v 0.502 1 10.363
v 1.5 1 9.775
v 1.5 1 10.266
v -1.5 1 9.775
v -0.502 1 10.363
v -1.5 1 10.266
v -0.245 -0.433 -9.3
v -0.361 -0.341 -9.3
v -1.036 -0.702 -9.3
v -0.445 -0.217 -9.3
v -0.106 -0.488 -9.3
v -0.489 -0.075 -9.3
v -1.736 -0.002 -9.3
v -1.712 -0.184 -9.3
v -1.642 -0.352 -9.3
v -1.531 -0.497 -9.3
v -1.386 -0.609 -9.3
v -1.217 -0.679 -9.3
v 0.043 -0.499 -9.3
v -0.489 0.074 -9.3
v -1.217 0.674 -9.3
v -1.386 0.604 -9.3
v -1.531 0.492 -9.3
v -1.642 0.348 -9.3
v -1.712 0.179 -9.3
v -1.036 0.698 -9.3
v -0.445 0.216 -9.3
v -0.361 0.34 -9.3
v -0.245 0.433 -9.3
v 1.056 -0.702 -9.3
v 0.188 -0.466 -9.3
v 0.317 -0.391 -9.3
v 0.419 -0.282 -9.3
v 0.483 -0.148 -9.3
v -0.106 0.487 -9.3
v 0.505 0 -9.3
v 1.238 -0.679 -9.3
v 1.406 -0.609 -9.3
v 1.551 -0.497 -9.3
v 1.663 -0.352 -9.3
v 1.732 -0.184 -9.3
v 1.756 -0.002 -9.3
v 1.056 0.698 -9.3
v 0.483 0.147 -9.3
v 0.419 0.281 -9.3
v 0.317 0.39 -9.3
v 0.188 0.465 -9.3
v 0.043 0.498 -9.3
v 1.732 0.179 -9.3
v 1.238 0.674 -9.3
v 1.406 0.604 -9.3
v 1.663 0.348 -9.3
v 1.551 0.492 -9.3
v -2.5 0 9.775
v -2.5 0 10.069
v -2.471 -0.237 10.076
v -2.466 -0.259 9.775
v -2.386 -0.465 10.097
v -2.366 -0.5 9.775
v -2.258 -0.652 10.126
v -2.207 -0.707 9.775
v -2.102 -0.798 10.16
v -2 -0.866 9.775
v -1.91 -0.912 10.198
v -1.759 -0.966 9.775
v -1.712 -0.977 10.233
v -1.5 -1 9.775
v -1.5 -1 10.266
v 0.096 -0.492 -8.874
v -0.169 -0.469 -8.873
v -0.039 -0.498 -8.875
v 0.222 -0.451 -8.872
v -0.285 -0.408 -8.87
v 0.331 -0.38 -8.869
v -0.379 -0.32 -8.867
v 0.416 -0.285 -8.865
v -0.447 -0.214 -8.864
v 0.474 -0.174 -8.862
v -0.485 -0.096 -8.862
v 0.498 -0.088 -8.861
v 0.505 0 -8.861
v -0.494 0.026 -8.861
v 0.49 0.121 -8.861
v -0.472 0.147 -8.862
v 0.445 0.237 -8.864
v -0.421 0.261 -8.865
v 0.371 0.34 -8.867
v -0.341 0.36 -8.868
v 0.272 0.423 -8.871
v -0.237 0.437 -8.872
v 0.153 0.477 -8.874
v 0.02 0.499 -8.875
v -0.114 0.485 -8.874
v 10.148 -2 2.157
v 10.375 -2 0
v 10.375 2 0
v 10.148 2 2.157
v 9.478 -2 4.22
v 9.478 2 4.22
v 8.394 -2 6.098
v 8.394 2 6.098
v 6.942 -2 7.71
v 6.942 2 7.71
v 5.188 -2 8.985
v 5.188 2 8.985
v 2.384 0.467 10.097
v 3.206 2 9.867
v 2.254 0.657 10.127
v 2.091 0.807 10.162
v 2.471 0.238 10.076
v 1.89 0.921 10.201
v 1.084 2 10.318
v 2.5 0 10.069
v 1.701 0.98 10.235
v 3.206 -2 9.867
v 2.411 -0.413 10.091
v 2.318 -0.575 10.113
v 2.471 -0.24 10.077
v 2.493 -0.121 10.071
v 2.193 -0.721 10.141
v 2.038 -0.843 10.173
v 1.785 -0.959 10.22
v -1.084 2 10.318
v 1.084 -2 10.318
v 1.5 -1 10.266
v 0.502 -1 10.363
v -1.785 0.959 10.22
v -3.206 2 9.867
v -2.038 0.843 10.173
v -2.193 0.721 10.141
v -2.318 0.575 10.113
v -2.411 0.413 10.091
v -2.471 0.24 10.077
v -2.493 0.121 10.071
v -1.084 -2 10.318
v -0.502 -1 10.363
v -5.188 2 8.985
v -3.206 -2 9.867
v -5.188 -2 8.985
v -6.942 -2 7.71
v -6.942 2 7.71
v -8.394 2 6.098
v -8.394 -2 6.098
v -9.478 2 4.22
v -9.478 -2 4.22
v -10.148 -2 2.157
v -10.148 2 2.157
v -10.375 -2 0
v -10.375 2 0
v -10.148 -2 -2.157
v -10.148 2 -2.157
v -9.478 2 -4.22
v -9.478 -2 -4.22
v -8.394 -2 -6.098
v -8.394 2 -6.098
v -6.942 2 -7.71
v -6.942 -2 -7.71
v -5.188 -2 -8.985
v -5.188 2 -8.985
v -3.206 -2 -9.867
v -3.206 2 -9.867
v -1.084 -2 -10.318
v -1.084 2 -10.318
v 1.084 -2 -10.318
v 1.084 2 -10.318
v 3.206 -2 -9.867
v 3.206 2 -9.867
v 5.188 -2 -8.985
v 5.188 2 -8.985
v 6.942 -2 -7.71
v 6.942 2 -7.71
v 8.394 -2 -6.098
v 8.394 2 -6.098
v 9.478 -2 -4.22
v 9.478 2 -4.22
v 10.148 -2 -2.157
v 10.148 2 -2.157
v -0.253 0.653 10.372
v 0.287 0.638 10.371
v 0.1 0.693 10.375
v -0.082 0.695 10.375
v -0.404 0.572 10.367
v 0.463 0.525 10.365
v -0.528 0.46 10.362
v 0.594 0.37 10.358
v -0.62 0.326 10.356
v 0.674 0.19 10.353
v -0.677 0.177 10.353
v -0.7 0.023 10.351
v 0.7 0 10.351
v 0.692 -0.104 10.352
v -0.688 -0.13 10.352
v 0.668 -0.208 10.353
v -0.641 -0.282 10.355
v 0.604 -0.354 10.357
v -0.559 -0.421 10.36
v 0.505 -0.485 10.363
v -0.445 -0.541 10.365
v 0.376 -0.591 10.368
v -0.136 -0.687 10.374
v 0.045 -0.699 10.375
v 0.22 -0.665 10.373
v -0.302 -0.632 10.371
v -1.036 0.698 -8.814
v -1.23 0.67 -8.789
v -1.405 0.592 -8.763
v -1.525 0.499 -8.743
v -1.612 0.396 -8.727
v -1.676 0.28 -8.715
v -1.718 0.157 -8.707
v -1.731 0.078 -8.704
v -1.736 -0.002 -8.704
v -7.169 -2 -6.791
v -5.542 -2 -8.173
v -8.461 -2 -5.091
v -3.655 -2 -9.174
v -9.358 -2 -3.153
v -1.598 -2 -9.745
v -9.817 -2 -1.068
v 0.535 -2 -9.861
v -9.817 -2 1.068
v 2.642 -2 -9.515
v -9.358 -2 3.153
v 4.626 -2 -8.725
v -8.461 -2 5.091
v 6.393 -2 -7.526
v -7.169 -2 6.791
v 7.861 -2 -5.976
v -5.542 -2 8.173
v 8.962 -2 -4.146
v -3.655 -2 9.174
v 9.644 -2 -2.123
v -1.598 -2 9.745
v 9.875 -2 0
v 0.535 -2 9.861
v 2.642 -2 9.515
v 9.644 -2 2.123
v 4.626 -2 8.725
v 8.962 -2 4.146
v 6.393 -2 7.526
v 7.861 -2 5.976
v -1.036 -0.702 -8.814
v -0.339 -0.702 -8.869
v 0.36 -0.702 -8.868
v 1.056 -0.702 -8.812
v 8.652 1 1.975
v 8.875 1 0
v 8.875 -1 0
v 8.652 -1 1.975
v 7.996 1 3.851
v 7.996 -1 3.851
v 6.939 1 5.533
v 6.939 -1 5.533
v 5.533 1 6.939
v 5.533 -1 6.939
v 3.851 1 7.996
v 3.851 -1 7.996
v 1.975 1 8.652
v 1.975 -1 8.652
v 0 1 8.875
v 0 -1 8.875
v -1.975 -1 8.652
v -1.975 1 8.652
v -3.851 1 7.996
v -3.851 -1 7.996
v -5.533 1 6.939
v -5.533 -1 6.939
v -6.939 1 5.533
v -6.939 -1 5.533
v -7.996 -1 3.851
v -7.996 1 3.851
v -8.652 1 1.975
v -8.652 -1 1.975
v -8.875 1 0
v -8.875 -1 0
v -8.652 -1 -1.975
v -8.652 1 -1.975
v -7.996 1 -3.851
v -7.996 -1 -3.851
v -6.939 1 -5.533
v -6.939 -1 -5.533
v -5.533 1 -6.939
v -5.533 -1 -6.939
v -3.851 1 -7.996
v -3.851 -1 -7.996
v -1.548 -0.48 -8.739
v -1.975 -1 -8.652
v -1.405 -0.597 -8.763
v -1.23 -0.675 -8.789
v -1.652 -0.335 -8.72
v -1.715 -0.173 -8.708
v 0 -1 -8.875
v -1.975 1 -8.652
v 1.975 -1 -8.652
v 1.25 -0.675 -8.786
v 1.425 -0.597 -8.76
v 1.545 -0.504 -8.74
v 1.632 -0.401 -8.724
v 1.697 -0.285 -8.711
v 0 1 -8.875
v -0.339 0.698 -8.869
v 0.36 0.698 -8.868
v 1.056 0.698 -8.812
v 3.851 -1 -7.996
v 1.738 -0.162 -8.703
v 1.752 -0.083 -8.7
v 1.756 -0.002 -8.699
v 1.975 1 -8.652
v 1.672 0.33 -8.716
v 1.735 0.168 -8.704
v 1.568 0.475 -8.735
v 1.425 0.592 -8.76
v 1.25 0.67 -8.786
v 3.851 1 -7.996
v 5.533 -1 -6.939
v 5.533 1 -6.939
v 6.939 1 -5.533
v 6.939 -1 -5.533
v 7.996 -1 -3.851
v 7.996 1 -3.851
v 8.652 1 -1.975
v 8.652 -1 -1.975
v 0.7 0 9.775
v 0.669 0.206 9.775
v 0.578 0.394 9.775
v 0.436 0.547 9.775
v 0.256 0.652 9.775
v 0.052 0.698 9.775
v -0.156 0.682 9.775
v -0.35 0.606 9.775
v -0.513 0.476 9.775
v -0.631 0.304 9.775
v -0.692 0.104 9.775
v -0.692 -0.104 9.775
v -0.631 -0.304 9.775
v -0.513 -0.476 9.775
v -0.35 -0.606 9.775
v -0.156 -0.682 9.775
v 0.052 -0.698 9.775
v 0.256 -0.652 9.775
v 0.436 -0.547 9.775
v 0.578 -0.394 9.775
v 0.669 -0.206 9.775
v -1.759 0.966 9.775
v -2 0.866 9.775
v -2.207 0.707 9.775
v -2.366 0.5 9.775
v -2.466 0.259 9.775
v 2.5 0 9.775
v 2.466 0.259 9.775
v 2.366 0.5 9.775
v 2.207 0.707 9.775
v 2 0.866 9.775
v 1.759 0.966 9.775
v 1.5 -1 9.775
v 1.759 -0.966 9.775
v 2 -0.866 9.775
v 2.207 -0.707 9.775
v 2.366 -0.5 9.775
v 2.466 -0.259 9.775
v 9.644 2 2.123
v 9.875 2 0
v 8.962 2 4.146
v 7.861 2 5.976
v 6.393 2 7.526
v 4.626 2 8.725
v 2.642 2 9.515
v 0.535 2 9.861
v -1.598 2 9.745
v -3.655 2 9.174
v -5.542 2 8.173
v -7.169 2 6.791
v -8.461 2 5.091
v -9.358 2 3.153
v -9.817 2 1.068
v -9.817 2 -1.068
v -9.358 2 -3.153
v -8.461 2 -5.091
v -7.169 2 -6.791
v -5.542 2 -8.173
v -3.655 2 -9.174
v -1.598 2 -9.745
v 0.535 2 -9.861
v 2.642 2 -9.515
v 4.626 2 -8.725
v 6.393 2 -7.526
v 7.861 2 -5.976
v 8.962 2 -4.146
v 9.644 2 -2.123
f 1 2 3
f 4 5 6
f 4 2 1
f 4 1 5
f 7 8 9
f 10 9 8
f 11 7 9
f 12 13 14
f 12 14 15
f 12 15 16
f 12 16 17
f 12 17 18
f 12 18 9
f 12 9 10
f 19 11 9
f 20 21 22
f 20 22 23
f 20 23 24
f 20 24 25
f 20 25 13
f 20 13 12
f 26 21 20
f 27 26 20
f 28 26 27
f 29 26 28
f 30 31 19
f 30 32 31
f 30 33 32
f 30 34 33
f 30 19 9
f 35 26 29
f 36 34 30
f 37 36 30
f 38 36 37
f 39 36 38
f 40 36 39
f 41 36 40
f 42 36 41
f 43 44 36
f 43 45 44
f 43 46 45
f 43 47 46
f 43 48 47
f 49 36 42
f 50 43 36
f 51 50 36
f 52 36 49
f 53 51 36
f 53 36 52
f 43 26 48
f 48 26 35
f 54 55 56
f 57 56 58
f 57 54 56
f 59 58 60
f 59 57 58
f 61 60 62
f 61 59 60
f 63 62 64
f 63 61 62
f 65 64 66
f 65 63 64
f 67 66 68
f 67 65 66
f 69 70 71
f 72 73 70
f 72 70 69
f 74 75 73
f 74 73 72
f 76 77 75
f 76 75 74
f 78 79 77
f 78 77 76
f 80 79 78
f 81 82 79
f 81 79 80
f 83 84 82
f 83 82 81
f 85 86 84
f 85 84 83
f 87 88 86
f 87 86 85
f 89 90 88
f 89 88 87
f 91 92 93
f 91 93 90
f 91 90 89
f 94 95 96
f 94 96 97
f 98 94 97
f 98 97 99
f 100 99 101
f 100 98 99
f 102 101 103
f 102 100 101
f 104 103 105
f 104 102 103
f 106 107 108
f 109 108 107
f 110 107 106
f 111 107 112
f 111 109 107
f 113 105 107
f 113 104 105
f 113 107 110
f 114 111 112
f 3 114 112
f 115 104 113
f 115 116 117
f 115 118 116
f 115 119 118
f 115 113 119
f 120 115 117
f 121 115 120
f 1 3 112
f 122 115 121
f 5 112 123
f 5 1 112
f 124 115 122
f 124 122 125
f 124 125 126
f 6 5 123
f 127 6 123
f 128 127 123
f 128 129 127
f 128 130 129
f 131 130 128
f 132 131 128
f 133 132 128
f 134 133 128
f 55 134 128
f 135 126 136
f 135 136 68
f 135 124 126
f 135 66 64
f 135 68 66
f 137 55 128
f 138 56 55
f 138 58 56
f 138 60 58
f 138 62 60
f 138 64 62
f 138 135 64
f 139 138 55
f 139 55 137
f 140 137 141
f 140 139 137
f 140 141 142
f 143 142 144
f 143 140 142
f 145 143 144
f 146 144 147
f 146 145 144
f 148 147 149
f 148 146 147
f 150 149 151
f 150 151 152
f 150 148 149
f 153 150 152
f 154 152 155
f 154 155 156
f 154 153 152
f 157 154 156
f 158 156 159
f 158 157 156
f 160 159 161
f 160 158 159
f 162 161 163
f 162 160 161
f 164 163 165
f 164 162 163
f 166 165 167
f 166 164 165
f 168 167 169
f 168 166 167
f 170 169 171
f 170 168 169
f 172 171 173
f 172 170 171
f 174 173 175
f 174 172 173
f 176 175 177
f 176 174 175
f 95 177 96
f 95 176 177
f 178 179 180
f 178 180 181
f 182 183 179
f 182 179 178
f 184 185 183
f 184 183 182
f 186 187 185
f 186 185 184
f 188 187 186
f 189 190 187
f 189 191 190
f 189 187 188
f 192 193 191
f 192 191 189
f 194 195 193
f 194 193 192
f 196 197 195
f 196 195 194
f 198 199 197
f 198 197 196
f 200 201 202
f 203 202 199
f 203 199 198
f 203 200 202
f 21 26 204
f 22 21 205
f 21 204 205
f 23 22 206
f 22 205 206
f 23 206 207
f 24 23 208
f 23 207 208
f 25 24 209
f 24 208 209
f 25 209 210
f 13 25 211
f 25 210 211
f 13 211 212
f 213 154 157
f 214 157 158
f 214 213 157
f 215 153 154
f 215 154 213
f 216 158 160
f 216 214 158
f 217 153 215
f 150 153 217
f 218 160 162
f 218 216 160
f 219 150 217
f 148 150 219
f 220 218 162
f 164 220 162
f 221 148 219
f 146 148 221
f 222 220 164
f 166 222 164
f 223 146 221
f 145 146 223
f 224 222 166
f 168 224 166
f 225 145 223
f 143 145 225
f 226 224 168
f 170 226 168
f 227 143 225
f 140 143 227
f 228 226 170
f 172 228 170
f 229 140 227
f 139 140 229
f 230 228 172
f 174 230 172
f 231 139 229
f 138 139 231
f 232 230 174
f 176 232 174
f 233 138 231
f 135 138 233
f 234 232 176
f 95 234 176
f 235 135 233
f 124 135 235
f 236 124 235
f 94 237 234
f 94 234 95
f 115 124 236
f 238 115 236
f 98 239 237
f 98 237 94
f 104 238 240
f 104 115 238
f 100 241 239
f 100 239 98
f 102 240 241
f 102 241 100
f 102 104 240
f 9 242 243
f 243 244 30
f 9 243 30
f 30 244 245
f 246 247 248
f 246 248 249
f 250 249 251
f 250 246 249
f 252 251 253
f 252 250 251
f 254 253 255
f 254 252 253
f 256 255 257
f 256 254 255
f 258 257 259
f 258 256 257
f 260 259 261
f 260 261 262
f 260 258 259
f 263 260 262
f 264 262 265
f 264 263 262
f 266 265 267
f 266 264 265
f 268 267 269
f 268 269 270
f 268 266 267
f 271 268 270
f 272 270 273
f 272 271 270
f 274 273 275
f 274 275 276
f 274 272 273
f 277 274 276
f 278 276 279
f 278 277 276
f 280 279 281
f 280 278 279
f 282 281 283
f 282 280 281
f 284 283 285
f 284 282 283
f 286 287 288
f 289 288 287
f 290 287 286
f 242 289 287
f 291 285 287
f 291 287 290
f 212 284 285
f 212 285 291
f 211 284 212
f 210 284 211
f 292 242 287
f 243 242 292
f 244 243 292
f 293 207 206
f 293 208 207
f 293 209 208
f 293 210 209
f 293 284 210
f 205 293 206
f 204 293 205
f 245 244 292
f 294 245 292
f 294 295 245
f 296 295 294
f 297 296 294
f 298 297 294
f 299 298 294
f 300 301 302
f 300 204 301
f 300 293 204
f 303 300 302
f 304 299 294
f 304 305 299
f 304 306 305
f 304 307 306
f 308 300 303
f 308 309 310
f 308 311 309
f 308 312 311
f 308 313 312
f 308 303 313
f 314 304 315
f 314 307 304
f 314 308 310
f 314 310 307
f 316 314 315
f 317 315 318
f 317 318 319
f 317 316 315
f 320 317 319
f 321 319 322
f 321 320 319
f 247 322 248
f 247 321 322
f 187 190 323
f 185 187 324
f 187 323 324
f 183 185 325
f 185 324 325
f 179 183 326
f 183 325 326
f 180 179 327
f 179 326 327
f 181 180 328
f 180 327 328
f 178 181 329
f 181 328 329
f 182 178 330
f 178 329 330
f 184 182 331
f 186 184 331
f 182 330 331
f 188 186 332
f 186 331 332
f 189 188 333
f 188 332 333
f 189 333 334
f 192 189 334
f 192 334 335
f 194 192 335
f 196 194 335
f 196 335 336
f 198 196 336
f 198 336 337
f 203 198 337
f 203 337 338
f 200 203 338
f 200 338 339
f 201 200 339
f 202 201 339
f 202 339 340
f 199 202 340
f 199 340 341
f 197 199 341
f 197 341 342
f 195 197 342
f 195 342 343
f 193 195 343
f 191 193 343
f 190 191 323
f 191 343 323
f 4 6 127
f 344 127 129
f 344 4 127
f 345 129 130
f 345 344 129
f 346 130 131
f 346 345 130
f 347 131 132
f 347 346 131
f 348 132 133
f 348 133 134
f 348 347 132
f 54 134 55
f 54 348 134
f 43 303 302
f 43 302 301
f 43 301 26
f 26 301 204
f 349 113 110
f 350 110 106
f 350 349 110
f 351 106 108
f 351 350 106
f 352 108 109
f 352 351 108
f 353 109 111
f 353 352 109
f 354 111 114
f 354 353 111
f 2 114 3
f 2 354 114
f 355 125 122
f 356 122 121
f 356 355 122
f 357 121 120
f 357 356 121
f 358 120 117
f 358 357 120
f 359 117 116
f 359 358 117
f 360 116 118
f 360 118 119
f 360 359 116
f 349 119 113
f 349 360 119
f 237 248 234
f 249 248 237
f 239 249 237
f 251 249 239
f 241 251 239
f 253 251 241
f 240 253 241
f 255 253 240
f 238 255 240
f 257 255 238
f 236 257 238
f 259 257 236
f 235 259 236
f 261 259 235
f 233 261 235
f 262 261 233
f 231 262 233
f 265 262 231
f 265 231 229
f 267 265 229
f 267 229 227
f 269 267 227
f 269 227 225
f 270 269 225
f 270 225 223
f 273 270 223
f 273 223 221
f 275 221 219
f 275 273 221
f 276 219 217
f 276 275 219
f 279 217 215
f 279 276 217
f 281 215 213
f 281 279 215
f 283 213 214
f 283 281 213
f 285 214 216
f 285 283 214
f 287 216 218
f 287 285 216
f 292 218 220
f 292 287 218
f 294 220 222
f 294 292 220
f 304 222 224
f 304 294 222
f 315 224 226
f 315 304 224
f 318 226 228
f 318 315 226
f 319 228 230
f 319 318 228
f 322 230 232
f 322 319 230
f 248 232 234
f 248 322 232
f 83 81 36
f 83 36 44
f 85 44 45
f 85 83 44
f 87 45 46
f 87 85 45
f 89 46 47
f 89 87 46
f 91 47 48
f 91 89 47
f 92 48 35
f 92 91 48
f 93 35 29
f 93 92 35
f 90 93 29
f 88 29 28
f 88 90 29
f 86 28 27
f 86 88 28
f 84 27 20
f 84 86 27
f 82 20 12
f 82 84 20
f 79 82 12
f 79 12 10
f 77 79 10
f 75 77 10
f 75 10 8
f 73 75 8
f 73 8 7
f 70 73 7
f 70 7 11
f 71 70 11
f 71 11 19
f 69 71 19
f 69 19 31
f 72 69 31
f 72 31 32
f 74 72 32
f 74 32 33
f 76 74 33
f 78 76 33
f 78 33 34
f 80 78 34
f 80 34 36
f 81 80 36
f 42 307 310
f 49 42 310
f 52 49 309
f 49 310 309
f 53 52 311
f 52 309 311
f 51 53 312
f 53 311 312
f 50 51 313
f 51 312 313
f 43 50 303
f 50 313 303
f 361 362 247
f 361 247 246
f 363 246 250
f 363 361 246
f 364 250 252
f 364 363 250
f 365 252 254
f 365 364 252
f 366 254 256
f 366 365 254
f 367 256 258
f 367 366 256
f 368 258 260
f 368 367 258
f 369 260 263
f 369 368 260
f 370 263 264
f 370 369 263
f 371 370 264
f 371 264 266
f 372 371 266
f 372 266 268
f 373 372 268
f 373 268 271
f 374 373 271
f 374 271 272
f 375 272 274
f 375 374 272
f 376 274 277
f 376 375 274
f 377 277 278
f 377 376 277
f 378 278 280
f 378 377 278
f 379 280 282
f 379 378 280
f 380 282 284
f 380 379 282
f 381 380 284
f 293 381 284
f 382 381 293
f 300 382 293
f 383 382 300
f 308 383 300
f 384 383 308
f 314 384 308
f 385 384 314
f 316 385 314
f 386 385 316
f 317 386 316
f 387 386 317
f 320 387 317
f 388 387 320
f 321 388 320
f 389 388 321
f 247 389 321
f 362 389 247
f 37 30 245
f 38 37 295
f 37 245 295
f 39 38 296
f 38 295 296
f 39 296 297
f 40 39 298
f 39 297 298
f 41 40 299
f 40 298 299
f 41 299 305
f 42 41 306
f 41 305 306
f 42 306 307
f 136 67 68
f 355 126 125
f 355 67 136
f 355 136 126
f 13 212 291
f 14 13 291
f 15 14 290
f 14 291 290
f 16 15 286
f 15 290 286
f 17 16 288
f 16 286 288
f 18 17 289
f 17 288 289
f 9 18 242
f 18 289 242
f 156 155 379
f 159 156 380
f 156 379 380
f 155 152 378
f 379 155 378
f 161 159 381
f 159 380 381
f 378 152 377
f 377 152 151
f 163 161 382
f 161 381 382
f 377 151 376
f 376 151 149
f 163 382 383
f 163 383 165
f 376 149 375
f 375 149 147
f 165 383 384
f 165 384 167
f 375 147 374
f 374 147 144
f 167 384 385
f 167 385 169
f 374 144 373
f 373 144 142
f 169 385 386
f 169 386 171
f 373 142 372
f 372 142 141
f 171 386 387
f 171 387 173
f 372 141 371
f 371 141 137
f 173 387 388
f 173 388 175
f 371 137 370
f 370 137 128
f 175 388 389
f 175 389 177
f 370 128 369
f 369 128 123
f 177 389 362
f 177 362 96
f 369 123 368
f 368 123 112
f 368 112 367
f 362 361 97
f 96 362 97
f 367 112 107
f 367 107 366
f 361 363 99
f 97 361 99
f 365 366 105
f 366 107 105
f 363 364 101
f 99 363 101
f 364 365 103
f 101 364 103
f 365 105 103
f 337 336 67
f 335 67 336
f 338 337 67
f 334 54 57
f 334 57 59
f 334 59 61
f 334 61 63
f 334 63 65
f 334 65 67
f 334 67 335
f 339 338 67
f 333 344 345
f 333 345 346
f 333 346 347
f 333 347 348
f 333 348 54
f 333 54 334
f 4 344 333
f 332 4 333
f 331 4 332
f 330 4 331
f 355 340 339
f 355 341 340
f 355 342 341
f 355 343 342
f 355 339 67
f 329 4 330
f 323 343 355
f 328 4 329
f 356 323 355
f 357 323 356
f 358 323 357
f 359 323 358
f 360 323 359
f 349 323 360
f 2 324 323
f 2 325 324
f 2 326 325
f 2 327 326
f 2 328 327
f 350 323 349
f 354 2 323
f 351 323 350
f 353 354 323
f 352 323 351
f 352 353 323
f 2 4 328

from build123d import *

# Parameters (mm, degrees)
F0_R          = 10.375
F0_R_2        = 8.875
F1_DEPTH      = 2
F1_DEPTH_BACK = 2
F2_SIZE       = 1
F4_START      = 9.775
F3_R          = 0.7
F4_DEPTH      = 15.225
F5_R          = 0.5
F6_DEPTH      = 9.3


with BuildPart() as f1:
    # F0 (on Front) → F1 (new body, two sides)
    with BuildSketch(Plane.XZ) as f1_sk:
        Circle(F0_R)
        Circle(F0_R_2, mode=Mode.SUBTRACT)
    extrude(amount=F1_DEPTH)
    extrude(f1_sk.sketch, amount=-F1_DEPTH_BACK)

    # F2
    f2_edges = [f1.edges().sort_by_distance(p)[0] for p in [
        (-8.875, -2, 0),
        (-8.875, 2, 0),
    ]]
    chamfer(f2_edges, length=F2_SIZE)

    # F3 (on Top) → F4 (cut)
    with BuildSketch(Plane.XY.offset(F4_START)):
        with BuildLine():
            Line((-1.5, -1), (1.5, -1))
            ThreePointArc((1.5, -1), (2.2071067812, -0.7071067812), (2.5, 0))
            ThreePointArc((2.5, 0), (2.2071067812, 0.7071067812), (1.5, 1))
            Line((1.5, 1), (-1.5, 1))
            ThreePointArc((-1.5, 1), (-2.2071067812, 0.7071067812), (-2.5, 0))
            ThreePointArc((-2.5, 0), (-2.2071067812, -0.7071067812), (-1.5, -1))
        make_face()
        Circle(F3_R, mode=Mode.SUBTRACT)
    extrude(amount=F4_DEPTH, mode=Mode.SUBTRACT)

    # F5 (on Top) → F6 (cut)
    with BuildSketch(Plane.XY):
        with BuildLine():
            ThreePointArc((1.7263360261, -2.2374776466), (1.521310773, -1.7425028998), (1.0263360261, -1.5374776466))
            Line((1.0263360261, -1.5374776466), (-1.0660886515, -1.5374776466))
            ThreePointArc((-1.0660886515, -1.5374776466), (-1.5610633983, -1.7425028998), (-1.7660886515, -2.2374776466))
            ThreePointArc((-1.7660886515, -2.2374776466), (-1.5610633983, -2.7324523935), (-1.0660886515, -2.9374776466))
            Line((-1.0660886515, -2.9374776466), (1.0263360261, -2.9374776466))
            ThreePointArc((1.0263360261, -2.9374776466), (1.521310773, -2.7324523935), (1.7263360261, -2.2374776466))
        make_face()
        with BuildLine():
            ThreePointArc((1.7563359968, -0.0024776423), (1.5513107436, 0.4924971045), (1.0563359968, 0.6975223577))
            Line((1.0563359968, 0.6975223577), (-1.0360886808, 0.6975223577))
            ThreePointArc((-1.0360886808, 0.6975223577), (-1.5310634277, 0.4924971045), (-1.7360886808, -0.0024776423))
            ThreePointArc((-1.7360886808, -0.0024776423), (-1.5310634277, -0.4974523892), (-1.0360886808, -0.7024776423))
            Line((-1.0360886808, -0.7024776423), (1.0563359968, -0.7024776423))
            ThreePointArc((1.0563359968, -0.7024776423), (1.5513107436, -0.4974523892), (1.7563359968, -0.0024776423))
        make_face()
        with Locations((0.0053813122, -0.0004659606)):
            Circle(F5_R, mode=Mode.SUBTRACT)
        with BuildLine():
            ThreePointArc((1.7263360261, 2.2689716425), (1.521310773, 2.7639463893), (1.0263360261, 2.9689716425))
            Line((1.0263360261, 2.9689716425), (-1.0660886515, 2.9689716425))
            ThreePointArc((-1.0660886515, 2.9689716425), (-1.5610633983, 2.7639463893), (-1.7660886515, 2.2689716425))
            ThreePointArc((-1.7660886515, 2.2689716425), (-1.5610633983, 1.7739968956), (-1.0660886515, 1.5689716425))
            Line((-1.0660886515, 1.5689716425), (1.0263360261, 1.5689716425))
            ThreePointArc((1.0263360261, 1.5689716425), (1.521310773, 1.7739968956), (1.7263360261, 2.2689716425))
        make_face()
    extrude(amount=-F6_DEPTH, mode=Mode.SUBTRACT)


solid = f1.part
